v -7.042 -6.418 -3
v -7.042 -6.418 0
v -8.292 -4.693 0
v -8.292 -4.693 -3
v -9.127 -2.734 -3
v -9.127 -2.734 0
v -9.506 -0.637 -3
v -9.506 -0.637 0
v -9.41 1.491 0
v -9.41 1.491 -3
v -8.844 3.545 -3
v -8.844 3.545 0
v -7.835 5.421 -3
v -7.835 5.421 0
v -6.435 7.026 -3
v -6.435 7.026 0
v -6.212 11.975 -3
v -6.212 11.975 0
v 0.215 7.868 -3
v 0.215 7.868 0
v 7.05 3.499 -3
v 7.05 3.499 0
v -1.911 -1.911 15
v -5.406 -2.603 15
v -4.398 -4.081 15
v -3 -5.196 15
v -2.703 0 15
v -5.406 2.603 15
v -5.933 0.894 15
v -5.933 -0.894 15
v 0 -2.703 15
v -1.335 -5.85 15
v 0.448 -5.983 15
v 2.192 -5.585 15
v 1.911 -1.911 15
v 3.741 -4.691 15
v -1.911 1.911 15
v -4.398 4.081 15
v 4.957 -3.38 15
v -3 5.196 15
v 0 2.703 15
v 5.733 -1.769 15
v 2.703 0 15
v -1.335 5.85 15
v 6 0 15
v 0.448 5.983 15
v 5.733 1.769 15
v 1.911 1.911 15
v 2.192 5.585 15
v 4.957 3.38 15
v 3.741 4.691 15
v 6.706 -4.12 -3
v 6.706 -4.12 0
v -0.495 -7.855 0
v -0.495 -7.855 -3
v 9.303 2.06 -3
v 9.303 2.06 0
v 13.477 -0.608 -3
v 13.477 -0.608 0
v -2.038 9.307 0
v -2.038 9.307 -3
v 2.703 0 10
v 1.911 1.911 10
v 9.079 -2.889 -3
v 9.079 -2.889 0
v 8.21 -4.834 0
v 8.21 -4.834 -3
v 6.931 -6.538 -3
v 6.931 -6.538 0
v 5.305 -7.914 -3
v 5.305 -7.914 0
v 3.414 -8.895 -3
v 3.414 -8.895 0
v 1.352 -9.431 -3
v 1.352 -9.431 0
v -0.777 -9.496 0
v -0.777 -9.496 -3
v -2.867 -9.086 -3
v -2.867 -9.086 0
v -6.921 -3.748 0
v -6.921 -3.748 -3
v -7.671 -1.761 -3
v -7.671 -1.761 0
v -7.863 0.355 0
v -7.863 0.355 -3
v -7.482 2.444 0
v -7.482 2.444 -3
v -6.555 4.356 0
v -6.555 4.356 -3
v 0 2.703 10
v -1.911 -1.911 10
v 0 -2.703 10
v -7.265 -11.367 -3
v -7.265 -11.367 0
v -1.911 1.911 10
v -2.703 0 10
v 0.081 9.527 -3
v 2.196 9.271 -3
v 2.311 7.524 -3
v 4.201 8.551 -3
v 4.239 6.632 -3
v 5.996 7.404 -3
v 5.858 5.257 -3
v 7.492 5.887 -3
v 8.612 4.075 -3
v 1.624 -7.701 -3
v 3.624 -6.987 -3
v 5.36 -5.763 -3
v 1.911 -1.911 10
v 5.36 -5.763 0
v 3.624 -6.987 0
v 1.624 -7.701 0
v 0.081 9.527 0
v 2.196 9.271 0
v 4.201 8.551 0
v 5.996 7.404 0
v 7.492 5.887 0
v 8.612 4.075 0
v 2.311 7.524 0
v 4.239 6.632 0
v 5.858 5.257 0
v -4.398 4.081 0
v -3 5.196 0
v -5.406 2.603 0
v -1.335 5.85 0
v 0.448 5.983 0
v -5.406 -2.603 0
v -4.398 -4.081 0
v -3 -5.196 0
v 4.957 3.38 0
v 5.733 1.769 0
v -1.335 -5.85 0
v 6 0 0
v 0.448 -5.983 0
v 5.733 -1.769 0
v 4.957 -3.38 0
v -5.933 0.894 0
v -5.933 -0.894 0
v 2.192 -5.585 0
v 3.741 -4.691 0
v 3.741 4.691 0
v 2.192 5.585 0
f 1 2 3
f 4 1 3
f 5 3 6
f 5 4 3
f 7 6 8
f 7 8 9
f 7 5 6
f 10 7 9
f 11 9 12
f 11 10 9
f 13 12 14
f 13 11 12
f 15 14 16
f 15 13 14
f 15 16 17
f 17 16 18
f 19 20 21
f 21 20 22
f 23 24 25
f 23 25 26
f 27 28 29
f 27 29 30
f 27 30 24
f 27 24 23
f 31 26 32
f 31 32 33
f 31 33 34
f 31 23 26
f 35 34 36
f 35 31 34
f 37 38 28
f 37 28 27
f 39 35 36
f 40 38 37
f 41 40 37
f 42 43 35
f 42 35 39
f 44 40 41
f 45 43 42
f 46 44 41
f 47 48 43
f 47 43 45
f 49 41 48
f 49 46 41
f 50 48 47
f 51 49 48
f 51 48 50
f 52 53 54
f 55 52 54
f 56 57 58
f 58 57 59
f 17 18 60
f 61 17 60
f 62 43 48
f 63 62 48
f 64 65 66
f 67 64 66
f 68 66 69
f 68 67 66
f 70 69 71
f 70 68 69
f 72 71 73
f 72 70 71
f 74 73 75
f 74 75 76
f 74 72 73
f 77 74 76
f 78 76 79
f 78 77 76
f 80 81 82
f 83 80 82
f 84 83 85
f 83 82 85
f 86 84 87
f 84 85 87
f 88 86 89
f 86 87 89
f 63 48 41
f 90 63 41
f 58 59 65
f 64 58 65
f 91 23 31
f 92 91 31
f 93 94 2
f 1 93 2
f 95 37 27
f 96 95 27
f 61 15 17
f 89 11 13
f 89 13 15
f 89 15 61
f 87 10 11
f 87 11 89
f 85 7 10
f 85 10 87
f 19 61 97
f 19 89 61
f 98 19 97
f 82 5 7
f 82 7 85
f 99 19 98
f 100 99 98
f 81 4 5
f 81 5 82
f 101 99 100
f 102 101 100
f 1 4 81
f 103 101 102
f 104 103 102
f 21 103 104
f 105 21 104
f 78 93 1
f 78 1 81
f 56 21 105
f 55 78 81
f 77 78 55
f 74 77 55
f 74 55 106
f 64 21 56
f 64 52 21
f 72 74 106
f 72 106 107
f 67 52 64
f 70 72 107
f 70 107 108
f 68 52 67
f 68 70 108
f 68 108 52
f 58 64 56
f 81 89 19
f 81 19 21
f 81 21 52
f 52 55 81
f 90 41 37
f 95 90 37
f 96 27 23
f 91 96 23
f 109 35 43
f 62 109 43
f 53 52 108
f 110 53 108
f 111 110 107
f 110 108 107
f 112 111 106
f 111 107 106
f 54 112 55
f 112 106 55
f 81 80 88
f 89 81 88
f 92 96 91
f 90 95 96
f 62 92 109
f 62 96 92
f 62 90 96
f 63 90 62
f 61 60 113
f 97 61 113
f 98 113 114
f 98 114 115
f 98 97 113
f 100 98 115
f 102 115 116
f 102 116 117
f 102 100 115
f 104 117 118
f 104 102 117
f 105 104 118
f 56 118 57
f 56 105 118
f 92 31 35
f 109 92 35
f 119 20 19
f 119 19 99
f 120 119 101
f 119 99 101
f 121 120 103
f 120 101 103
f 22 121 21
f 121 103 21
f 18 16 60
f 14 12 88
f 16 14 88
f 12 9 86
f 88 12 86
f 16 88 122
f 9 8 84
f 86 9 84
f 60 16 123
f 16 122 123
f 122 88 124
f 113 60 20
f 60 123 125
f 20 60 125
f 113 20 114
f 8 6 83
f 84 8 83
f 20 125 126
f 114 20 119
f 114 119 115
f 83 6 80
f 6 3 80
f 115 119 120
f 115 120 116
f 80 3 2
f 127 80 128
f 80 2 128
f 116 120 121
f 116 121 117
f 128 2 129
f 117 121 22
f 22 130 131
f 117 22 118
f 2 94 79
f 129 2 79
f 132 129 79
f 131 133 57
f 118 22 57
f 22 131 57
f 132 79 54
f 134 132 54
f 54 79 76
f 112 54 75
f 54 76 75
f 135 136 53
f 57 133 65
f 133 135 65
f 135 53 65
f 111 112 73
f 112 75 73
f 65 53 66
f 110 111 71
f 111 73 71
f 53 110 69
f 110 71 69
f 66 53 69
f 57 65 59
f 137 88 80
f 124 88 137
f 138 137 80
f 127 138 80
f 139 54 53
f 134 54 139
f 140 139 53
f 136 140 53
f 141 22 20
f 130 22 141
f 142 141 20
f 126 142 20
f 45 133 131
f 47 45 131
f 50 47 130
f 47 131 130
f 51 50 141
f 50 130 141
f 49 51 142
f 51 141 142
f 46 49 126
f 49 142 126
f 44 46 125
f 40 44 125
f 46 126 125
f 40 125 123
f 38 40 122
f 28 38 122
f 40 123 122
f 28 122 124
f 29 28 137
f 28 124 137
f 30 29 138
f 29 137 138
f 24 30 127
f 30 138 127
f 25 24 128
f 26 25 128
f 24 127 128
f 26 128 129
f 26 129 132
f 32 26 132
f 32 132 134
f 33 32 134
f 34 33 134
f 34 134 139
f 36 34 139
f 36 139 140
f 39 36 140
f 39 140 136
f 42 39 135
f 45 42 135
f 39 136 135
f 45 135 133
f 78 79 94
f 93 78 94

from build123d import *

# Parameters (mm, degrees)
F0_R     = 6
F1_DEPTH = 15
F3_DEPTH = 5
F5_DEPTH = 3
F6_R     = 9.527798
F6_R_2   = 7.870818
F7_DEPTH = 3


with BuildPart() as f1:
    # F0 (on Top) → F1 (new body)
    with BuildSketch(Plane.XY):
        Circle(F0_R)
    extrude(amount=F1_DEPTH)

    # F2 (on face) → F3 (cut)
    with BuildSketch(Plane.XY.offset(15)):
        Polygon((1.911385, 1.911385), (0, 2.703106), (-1.911385, 1.911385), (-2.703106, 0), (-1.911385, -1.911385), (0, -2.703106), (1.911385, -1.911385), (2.703106, 0), align=None)
    extrude(amount=-F3_DEPTH, mode=Mode.SUBTRACT)

    # F4 (on face) → F5 (join)
    with BuildSketch(Plane(origin=(0, 0, 0), x_dir=(1, 0, 0), z_dir=(0, 0, -1))):
        Polygon((-6.211701, -11.975178), (13.476659, 0.608098), (-7.264957, 11.36708), align=None)
    extrude(amount=F5_DEPTH)

    # F6 (on face) → F7 (join)
    with BuildSketch(Plane(origin=(0, 0, -3), x_dir=(1, 0, 0), z_dir=(0, 0, -1))):
        Circle(F6_R)
        Circle(F6_R_2, mode=Mode.SUBTRACT)
    extrude(amount=-F7_DEPTH)


solid = f1.part
